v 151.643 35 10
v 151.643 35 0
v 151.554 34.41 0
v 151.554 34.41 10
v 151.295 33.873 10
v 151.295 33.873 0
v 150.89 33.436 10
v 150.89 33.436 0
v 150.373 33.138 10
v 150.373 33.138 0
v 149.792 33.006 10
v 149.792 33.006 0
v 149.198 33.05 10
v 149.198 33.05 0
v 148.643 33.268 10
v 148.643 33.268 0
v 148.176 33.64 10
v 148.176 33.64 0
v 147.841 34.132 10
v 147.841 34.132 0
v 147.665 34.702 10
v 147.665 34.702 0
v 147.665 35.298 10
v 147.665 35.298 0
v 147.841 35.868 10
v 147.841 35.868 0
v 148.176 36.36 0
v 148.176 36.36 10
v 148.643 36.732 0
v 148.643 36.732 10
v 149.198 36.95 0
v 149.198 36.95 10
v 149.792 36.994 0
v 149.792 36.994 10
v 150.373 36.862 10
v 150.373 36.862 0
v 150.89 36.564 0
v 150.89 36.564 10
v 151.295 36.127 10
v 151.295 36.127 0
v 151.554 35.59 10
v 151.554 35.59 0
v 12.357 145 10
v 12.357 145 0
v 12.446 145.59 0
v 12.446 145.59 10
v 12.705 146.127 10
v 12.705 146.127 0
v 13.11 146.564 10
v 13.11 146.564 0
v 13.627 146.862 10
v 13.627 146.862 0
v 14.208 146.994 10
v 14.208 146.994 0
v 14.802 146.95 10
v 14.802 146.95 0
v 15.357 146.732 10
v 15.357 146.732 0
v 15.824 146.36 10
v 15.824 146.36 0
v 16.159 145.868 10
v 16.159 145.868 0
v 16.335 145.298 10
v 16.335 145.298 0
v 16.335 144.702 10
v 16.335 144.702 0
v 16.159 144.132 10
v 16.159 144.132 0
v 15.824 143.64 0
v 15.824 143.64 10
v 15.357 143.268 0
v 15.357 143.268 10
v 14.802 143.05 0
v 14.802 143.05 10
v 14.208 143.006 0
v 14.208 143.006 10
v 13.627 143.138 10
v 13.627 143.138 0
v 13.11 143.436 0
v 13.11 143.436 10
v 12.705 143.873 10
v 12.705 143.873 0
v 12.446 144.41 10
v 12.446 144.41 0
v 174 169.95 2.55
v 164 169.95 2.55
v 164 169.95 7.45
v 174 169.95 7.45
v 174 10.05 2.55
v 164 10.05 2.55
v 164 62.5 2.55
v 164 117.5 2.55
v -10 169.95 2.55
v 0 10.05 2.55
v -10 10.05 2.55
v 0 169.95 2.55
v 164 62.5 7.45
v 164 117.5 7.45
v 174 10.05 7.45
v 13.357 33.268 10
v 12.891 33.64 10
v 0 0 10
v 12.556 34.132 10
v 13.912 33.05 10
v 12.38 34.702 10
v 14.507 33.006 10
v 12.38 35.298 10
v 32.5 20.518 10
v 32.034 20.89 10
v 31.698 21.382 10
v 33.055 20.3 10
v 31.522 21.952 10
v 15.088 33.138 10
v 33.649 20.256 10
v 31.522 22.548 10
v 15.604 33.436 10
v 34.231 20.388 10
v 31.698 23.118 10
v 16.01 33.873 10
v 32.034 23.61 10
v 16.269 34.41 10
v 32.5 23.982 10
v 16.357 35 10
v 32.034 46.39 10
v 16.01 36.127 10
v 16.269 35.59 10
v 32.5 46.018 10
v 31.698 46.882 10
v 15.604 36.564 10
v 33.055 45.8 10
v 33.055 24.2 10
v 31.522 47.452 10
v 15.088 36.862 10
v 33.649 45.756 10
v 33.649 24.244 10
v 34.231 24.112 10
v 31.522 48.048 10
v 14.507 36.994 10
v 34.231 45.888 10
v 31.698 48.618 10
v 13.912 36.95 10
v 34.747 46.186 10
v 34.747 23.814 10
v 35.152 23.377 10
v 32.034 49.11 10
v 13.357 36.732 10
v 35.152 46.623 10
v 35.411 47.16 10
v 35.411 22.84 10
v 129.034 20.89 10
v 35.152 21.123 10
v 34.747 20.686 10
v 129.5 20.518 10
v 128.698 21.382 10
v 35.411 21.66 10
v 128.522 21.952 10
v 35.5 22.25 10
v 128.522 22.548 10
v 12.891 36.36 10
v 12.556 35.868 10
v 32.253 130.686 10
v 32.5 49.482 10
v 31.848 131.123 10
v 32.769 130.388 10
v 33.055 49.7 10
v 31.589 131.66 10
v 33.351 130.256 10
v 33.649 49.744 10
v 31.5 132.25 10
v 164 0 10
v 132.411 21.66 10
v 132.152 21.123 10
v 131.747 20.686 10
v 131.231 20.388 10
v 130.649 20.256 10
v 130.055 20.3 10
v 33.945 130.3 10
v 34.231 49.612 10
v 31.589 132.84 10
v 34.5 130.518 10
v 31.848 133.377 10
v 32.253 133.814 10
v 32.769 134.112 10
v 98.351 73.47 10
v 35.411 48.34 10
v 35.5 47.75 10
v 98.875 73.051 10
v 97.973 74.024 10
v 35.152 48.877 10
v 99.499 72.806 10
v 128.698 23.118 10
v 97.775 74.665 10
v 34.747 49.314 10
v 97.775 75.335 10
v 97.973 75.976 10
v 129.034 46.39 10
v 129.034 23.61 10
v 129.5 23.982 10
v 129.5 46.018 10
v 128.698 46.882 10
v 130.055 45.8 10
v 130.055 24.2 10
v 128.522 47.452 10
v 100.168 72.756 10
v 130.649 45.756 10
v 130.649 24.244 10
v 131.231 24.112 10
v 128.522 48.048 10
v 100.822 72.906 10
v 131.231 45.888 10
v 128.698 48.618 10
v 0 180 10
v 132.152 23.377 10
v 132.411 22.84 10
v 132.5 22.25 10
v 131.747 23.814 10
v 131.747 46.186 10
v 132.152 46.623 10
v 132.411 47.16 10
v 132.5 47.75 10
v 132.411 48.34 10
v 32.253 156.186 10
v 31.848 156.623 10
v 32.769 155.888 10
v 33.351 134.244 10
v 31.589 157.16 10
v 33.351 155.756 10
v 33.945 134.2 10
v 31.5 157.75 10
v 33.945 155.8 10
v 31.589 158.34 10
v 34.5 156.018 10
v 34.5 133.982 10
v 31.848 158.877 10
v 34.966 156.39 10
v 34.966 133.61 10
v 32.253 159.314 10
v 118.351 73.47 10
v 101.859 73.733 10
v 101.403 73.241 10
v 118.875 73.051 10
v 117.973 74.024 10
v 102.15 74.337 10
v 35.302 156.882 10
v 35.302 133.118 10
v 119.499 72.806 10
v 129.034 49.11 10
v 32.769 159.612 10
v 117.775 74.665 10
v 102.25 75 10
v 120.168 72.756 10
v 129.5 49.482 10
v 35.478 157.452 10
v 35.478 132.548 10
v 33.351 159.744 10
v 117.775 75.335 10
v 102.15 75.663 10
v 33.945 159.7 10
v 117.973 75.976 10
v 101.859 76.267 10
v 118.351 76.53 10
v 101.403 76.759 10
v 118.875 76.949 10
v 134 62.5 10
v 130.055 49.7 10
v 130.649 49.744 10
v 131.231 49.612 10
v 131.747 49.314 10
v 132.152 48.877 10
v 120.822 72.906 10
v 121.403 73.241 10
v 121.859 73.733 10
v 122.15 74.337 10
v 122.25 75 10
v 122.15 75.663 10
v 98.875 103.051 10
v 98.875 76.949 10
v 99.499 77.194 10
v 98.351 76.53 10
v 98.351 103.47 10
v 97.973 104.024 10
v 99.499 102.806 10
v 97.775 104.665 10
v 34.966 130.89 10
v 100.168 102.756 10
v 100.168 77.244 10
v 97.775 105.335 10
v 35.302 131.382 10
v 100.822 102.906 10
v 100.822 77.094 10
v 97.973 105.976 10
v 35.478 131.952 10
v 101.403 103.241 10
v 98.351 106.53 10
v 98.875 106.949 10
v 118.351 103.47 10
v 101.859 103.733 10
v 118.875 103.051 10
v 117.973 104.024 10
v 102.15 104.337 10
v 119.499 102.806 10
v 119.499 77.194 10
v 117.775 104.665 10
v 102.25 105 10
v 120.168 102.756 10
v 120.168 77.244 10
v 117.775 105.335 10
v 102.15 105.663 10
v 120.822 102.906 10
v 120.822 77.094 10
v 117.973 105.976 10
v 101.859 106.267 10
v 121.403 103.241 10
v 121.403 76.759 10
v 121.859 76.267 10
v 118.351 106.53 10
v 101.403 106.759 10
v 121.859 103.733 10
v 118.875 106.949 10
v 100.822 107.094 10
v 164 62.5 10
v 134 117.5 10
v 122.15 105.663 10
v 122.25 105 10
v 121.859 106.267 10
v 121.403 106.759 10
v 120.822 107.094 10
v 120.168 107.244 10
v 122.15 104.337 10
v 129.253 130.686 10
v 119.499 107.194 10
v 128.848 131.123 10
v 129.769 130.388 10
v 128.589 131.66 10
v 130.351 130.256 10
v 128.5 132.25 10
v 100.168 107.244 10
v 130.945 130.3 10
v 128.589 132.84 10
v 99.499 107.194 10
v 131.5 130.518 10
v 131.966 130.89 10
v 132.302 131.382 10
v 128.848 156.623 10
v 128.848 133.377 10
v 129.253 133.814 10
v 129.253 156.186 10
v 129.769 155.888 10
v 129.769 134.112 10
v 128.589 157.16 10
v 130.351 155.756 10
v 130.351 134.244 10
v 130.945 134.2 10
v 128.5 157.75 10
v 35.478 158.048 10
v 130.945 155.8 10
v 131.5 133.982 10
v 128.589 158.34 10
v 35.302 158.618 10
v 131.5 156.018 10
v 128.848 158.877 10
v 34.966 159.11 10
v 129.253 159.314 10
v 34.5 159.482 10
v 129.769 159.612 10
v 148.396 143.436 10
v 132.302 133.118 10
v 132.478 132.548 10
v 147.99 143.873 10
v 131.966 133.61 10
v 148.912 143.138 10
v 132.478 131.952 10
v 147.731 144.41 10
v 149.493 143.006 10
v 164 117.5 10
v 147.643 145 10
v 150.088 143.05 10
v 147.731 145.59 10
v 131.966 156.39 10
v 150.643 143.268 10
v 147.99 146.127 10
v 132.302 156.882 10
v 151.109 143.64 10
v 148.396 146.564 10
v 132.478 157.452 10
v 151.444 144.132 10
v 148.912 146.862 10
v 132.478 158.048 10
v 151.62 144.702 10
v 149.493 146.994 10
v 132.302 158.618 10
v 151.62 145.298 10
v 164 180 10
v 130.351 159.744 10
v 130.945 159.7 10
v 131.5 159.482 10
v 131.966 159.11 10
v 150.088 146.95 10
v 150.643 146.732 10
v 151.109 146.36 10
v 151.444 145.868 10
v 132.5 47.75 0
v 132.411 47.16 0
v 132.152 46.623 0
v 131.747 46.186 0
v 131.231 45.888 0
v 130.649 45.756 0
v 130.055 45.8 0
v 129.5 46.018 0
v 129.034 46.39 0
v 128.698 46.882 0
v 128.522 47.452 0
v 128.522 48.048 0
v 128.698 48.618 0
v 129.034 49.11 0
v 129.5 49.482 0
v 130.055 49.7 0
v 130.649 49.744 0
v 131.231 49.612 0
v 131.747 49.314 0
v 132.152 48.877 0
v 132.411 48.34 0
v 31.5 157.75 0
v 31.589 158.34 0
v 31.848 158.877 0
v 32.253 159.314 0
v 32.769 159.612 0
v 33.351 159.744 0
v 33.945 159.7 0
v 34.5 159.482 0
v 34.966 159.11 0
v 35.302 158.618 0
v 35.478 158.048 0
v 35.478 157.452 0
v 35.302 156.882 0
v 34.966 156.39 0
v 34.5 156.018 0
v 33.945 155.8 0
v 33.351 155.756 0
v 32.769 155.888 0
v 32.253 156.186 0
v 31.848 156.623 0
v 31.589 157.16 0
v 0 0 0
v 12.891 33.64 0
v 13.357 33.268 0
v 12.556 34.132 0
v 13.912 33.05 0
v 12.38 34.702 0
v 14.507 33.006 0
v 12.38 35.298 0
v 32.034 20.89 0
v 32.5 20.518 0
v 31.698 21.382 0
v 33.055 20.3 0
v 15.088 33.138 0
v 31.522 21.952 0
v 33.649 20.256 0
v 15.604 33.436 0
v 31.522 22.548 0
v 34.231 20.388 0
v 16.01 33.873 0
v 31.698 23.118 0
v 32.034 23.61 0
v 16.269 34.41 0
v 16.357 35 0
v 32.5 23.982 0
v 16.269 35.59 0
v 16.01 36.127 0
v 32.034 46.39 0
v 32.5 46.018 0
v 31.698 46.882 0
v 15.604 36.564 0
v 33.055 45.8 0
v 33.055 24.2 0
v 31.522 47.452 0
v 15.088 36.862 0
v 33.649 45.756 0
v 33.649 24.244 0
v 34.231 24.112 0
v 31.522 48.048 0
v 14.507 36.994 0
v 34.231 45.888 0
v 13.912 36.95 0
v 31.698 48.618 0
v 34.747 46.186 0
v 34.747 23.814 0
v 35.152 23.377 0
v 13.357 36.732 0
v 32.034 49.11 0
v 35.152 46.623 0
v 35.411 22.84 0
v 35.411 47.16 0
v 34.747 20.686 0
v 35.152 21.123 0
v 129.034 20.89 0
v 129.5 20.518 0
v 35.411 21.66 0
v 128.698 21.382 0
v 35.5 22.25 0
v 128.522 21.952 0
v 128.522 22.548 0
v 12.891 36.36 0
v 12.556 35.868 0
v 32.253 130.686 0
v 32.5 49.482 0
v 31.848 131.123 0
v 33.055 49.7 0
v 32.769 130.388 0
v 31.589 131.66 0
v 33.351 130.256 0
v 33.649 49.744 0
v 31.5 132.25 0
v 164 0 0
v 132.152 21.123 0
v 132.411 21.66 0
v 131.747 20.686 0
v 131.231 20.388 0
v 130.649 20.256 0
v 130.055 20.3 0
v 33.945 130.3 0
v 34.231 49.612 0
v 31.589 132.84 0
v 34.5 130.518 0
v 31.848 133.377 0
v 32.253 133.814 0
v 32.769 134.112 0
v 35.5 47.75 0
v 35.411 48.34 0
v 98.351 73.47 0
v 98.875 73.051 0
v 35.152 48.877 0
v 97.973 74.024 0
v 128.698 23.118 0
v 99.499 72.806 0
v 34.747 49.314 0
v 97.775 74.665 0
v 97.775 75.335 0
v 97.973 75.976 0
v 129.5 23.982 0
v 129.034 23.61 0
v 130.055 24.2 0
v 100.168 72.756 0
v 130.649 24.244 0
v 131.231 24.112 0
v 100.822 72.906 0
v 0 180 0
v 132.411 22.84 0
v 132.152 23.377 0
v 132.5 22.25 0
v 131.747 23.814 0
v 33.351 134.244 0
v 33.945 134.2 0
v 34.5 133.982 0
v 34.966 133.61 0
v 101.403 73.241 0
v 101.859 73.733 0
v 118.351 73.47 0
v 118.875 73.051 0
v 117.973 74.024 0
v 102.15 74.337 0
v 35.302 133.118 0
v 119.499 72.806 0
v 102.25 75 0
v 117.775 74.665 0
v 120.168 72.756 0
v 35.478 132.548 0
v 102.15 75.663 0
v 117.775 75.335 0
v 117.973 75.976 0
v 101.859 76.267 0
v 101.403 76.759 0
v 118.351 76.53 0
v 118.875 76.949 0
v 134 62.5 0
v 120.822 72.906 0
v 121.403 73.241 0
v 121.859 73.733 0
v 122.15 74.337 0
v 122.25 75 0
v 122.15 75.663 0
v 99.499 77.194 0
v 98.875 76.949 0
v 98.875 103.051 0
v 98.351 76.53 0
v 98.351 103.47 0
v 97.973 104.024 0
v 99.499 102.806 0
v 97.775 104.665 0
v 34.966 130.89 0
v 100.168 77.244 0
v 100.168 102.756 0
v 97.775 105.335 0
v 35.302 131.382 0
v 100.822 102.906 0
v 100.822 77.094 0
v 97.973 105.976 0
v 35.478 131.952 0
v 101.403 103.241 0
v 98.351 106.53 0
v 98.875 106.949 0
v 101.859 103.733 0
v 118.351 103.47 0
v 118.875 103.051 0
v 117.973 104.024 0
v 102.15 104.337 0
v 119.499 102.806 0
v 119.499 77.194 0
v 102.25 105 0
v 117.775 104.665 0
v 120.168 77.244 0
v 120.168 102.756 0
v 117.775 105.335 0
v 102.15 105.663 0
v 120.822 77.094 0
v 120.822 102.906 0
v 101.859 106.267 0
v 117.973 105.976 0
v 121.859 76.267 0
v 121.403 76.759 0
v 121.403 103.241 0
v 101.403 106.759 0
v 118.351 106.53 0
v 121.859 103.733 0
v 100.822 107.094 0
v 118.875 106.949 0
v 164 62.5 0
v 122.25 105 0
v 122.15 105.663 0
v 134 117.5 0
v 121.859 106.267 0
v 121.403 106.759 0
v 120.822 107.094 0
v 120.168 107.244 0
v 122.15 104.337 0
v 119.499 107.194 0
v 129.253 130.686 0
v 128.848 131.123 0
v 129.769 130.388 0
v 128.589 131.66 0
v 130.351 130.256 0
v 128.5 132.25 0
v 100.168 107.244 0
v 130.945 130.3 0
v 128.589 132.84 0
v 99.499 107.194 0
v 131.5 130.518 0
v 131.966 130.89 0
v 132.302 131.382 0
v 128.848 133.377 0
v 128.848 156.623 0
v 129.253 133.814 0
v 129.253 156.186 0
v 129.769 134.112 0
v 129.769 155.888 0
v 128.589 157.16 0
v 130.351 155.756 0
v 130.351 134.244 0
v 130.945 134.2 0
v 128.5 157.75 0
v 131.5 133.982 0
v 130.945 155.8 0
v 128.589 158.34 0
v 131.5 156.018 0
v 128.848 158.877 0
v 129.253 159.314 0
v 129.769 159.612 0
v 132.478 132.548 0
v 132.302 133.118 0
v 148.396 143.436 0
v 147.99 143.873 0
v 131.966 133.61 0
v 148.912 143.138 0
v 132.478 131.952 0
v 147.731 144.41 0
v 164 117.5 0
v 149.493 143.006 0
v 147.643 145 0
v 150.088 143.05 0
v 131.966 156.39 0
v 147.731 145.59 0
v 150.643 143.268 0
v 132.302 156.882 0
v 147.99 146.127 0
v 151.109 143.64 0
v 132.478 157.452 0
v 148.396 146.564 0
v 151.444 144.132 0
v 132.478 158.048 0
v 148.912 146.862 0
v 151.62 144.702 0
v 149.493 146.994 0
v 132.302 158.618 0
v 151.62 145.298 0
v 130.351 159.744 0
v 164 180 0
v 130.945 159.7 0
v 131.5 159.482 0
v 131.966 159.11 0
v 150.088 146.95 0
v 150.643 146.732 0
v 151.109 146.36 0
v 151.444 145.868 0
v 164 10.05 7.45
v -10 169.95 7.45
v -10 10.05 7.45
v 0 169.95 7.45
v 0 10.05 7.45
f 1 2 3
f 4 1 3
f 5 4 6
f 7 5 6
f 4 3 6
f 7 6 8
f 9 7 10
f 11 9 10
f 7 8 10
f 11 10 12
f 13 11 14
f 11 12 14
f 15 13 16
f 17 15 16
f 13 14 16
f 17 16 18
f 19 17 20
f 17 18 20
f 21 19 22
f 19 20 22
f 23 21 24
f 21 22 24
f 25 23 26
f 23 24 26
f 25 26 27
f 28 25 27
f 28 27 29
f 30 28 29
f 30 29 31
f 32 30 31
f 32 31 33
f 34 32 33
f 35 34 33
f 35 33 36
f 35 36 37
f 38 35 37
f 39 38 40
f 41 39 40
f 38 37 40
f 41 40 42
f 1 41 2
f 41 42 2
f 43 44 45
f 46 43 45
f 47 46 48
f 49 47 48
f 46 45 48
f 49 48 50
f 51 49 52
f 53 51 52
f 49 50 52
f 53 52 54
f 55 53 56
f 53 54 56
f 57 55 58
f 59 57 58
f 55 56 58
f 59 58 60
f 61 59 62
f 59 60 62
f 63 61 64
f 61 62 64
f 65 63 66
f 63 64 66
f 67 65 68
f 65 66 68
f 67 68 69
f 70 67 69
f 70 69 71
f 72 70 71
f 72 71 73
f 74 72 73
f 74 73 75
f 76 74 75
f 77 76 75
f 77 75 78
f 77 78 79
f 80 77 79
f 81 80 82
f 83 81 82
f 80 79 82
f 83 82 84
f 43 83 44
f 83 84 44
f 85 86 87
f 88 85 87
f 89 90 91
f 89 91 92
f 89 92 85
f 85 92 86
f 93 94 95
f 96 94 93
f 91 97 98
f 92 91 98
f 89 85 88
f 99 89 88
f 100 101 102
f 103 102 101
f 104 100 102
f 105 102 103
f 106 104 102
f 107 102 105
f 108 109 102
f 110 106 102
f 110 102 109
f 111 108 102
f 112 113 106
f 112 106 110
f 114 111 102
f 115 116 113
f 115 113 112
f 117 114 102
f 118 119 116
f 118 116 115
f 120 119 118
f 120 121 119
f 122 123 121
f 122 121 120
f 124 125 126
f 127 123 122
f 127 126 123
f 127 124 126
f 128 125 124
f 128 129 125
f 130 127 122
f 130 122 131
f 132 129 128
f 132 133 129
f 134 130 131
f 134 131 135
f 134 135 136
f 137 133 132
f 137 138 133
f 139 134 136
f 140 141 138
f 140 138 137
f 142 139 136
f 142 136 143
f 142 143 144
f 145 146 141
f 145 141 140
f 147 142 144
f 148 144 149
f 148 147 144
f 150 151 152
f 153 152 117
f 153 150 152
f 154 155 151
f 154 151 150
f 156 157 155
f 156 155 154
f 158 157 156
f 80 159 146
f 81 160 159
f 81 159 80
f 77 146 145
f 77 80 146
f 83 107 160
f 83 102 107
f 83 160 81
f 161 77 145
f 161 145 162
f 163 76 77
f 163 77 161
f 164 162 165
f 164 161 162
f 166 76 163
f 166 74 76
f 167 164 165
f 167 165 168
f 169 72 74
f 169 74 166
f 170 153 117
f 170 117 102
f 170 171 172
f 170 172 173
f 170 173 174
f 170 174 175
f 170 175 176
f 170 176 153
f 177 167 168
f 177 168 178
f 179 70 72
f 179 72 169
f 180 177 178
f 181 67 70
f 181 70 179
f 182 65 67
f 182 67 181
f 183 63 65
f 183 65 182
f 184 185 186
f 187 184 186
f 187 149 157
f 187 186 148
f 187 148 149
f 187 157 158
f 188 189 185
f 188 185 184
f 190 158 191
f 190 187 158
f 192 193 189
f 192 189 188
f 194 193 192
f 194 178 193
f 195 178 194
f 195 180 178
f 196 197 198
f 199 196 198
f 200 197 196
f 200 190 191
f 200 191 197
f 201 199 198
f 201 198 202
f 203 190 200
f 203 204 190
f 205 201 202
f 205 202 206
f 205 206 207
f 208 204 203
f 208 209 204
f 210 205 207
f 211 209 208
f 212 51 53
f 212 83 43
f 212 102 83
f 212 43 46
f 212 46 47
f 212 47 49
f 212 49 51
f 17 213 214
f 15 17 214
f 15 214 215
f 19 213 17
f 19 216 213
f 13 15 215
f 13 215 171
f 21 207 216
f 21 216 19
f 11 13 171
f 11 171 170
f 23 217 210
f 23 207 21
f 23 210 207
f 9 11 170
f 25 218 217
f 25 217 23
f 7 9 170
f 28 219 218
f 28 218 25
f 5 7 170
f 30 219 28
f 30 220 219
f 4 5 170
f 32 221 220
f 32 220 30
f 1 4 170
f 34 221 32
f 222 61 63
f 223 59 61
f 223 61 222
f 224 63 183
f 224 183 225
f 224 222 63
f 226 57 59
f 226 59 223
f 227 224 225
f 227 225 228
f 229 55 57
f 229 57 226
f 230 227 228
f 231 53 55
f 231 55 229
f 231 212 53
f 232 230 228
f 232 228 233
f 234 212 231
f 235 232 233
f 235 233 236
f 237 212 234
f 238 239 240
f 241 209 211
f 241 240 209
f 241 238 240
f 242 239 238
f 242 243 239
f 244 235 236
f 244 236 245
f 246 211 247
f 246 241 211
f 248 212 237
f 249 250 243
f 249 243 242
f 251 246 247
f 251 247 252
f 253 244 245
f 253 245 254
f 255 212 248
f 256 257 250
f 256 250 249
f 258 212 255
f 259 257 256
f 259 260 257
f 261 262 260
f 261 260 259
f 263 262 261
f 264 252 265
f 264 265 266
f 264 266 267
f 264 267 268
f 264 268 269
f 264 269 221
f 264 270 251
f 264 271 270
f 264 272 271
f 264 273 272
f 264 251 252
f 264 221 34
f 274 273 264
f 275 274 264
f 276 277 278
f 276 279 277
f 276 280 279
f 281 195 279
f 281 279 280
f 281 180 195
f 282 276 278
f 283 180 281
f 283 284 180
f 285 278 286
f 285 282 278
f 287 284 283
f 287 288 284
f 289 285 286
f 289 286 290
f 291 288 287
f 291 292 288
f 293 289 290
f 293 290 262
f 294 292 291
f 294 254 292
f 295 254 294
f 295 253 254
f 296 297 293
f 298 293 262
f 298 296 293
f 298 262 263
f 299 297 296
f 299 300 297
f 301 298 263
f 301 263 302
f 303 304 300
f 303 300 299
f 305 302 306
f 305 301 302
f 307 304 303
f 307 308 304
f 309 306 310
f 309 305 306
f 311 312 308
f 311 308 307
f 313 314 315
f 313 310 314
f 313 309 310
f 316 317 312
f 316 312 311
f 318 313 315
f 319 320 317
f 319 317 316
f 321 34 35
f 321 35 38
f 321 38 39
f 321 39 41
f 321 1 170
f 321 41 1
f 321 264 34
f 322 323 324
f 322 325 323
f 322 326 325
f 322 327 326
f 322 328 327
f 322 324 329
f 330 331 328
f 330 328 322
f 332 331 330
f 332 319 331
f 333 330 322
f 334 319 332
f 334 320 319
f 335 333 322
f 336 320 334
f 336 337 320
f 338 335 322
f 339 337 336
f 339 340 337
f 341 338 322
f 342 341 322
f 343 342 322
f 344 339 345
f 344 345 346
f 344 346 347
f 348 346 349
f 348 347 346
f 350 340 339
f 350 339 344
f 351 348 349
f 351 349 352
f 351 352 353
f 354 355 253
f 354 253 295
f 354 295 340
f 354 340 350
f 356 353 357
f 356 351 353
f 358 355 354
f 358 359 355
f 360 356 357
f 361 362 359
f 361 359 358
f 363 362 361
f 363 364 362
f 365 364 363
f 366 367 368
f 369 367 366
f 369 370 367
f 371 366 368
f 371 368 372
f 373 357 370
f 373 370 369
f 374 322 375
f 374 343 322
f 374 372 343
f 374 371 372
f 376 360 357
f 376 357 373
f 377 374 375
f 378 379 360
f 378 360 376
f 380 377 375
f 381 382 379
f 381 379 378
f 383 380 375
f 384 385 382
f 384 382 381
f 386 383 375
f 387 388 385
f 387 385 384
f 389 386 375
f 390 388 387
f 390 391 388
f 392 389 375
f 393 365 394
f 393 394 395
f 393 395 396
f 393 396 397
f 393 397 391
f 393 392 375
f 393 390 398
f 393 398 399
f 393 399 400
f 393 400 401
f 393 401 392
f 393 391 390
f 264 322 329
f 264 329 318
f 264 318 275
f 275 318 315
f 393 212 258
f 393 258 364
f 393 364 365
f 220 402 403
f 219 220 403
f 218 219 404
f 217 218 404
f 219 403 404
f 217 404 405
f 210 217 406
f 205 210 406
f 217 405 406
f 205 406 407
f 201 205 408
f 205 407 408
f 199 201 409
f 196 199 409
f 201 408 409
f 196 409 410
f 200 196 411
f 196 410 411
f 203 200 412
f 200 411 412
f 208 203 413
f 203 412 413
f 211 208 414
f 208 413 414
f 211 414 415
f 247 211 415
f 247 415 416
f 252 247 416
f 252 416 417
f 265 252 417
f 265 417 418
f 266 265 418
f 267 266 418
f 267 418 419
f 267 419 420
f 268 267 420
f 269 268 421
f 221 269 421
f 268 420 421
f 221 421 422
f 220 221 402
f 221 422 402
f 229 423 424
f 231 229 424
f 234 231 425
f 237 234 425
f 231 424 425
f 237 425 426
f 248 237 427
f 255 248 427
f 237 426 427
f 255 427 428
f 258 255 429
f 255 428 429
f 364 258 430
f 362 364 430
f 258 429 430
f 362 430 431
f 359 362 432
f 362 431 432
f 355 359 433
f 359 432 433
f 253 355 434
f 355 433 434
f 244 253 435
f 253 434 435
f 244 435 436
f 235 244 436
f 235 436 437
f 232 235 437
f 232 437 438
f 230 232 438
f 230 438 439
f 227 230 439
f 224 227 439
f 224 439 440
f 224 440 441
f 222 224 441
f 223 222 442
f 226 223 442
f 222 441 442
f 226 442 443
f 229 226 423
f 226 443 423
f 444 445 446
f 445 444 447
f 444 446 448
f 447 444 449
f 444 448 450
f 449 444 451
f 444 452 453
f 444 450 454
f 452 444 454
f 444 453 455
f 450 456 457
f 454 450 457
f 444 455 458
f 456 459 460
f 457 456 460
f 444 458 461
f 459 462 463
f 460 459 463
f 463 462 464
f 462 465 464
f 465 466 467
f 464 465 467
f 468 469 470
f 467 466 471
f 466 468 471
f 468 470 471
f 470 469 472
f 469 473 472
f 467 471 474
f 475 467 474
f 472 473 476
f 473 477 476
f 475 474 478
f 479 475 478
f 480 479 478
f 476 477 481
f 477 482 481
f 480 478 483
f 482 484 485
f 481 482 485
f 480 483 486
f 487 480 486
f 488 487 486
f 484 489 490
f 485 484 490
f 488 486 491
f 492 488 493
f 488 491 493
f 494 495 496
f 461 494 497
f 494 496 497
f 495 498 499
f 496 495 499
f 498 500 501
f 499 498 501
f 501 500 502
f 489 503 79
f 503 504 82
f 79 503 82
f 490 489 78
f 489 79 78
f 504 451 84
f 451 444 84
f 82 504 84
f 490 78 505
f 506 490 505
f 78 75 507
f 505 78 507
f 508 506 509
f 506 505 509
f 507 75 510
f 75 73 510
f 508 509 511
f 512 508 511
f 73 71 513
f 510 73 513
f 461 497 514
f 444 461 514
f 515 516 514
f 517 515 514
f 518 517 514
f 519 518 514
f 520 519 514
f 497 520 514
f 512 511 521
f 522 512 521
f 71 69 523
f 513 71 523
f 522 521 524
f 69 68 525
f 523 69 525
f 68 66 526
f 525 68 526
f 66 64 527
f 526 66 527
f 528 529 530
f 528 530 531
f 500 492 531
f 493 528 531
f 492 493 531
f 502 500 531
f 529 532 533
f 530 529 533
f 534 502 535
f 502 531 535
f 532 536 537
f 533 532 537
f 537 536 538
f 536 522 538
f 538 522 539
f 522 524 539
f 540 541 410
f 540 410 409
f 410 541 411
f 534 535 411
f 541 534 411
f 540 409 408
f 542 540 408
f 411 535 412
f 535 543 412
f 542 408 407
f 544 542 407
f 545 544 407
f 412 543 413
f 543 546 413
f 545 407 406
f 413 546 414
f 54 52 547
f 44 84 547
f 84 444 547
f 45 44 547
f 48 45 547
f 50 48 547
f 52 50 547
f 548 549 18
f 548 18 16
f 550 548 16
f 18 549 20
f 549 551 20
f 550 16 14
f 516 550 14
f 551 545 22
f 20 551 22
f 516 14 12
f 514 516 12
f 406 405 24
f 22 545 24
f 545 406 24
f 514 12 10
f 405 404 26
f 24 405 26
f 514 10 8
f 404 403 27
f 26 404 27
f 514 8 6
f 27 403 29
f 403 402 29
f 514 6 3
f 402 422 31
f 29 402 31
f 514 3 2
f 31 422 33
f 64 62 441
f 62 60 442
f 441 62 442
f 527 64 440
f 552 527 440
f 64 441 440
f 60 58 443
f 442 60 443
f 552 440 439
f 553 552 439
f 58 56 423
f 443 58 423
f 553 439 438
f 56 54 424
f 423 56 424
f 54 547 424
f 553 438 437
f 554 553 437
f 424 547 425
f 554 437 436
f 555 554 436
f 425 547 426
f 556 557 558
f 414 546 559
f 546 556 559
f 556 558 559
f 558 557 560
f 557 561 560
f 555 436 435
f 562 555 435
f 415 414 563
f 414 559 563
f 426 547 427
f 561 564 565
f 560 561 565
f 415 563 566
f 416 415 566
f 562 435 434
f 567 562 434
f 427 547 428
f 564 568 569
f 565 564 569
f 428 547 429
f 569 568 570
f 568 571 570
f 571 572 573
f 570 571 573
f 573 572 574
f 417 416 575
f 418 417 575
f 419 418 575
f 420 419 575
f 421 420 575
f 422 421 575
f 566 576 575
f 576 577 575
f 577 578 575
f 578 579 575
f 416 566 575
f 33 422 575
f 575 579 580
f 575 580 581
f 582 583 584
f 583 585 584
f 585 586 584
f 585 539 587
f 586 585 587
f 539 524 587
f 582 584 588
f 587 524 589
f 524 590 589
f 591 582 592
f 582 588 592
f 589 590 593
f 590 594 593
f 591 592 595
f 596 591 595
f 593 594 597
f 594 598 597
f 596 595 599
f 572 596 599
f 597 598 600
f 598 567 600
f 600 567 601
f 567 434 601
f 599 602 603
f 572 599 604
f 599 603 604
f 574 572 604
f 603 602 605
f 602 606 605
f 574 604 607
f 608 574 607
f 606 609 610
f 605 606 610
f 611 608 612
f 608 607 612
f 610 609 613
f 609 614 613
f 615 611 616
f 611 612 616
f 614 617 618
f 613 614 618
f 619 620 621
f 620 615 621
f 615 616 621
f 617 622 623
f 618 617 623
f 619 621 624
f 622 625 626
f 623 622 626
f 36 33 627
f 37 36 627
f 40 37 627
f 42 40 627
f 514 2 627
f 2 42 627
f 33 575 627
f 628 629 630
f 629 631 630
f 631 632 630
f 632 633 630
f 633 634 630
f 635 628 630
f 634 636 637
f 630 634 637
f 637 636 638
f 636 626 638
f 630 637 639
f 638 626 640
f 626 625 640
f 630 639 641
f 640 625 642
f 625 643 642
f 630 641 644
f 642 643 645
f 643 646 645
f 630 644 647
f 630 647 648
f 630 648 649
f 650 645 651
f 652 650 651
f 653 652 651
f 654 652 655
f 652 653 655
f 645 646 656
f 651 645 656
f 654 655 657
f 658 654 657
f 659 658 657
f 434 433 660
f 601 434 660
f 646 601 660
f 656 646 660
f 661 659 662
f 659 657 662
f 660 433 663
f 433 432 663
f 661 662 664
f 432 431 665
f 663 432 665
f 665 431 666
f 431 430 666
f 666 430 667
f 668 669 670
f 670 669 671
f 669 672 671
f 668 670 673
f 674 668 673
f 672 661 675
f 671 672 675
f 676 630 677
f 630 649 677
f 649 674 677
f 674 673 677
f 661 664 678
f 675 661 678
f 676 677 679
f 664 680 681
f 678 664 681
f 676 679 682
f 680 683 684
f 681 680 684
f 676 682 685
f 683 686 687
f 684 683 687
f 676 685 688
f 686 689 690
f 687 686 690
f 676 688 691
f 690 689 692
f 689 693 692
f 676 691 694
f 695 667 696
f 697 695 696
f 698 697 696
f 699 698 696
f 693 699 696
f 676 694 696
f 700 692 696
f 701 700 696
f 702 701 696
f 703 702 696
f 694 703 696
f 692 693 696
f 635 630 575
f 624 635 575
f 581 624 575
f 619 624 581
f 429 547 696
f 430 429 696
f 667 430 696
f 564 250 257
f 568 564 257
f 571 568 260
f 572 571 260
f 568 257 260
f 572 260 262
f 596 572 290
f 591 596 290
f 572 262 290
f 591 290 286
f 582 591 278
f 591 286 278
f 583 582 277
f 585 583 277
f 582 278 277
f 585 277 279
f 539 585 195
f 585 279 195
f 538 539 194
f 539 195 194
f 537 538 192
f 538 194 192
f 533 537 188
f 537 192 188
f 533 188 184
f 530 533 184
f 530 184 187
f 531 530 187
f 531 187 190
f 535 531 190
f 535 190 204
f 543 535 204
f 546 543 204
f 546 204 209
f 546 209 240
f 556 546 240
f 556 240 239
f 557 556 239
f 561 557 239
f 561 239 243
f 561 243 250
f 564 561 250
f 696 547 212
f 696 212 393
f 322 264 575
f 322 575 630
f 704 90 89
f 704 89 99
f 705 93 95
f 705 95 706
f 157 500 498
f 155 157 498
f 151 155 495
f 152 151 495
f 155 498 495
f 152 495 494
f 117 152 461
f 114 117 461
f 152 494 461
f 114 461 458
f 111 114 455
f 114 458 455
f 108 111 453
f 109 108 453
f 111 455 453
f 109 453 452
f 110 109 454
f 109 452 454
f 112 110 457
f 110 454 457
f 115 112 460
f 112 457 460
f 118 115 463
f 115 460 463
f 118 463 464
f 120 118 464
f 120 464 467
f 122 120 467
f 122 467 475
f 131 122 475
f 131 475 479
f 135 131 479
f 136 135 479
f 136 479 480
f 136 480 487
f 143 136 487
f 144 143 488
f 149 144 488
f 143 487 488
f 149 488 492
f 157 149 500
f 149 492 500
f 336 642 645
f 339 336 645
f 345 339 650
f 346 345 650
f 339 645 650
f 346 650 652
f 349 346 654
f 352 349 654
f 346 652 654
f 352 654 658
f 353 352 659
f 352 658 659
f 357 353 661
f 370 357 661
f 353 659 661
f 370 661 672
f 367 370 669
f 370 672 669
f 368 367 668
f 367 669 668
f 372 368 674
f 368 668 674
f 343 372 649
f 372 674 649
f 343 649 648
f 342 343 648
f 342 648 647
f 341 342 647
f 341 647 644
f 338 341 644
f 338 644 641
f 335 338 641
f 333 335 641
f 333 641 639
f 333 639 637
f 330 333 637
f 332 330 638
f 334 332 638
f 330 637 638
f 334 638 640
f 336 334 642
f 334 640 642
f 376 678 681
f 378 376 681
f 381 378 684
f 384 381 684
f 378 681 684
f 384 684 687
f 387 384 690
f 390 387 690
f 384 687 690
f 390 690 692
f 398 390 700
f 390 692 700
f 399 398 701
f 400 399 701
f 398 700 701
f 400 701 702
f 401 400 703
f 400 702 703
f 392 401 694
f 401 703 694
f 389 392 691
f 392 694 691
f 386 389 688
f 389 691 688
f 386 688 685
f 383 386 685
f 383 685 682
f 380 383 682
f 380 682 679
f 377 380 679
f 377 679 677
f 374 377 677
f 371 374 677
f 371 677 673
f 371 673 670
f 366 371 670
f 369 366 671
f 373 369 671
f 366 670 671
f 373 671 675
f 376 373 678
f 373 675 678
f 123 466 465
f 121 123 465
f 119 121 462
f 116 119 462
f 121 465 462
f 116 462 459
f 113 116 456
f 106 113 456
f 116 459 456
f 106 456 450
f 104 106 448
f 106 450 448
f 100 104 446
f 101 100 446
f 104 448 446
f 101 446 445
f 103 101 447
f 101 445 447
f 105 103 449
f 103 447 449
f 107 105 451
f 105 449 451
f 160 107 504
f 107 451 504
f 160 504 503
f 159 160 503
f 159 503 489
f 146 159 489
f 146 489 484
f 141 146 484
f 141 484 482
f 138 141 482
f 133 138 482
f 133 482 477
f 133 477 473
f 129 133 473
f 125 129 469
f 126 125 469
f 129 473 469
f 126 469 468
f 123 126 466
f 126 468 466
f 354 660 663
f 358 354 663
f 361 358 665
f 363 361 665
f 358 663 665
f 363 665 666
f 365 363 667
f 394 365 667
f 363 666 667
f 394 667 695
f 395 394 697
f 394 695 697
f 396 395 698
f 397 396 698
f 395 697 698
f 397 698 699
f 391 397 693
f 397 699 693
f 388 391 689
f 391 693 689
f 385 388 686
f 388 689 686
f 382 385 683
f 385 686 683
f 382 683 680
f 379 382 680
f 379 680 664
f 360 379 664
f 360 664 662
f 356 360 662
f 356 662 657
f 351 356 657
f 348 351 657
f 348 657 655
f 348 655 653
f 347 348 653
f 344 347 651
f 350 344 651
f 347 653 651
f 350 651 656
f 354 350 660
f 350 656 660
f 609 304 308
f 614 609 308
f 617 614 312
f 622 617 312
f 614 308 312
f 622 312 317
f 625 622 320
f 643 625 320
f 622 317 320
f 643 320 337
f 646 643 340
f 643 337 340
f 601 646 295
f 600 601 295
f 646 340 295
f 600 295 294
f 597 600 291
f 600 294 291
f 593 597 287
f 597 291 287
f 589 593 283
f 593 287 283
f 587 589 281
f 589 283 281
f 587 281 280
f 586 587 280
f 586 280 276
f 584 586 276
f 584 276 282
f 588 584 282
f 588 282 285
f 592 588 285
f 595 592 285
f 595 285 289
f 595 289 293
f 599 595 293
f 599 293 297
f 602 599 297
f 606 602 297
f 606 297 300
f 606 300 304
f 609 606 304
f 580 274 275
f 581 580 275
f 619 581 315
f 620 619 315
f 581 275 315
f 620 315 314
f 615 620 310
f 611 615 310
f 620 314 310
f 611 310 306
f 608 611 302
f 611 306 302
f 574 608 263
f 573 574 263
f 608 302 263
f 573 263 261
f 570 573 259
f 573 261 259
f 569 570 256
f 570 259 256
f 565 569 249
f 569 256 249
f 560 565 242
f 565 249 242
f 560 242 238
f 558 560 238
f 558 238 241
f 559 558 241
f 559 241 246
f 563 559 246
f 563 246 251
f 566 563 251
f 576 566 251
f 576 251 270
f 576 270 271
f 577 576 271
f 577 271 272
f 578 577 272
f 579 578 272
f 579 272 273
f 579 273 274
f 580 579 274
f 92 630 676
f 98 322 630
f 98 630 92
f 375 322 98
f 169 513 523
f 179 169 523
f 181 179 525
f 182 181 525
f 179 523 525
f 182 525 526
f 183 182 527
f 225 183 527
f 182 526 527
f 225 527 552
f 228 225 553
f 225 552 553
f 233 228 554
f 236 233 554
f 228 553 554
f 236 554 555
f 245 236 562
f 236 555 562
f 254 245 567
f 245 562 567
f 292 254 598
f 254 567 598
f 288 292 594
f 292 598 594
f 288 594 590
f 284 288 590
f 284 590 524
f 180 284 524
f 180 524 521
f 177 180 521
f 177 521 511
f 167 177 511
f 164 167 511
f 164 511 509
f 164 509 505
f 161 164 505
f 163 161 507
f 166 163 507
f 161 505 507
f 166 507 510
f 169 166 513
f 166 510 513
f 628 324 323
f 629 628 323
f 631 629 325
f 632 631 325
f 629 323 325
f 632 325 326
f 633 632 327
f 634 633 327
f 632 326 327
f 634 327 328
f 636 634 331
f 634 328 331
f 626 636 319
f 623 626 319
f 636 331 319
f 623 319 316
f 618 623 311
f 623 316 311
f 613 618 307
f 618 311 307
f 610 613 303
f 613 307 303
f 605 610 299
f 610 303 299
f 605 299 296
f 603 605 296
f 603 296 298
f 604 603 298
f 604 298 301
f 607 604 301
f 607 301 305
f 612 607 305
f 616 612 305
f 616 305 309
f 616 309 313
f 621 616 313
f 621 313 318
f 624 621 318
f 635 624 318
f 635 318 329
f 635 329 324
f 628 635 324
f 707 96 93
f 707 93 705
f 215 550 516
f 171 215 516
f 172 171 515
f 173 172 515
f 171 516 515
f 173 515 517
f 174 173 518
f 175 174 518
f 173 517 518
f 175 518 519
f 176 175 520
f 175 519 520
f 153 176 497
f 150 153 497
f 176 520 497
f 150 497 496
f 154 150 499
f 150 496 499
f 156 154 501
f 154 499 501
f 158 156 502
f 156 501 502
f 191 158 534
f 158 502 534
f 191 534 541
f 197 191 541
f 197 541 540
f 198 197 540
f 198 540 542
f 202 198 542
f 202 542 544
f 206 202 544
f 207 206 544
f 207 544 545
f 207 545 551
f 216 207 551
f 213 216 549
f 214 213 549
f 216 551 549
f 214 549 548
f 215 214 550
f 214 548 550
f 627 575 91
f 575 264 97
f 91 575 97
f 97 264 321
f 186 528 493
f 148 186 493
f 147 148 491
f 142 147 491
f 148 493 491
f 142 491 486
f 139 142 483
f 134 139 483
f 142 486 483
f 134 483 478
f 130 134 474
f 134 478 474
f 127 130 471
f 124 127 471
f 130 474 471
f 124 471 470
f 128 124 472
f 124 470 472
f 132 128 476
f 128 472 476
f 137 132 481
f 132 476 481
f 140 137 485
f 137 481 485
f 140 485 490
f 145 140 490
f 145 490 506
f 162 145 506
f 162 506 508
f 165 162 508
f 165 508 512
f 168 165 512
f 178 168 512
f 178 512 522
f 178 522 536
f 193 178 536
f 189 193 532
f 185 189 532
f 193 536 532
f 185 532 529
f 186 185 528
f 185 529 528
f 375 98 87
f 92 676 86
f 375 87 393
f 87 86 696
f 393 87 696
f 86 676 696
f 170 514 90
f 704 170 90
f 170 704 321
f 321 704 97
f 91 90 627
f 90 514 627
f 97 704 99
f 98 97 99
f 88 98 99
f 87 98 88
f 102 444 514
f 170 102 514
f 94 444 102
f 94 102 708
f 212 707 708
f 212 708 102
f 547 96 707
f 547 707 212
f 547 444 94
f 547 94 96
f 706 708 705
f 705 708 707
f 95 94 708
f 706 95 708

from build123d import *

# Parameters (mm, degrees)
SKETCH_1_W          = 164
SKETCH_1_H          = 180
EXTRUDE_1_DEPTH     = 10
SKETCH_2_W          = 4.9
SKETCH_2_H          = 159.9
EXTRUDE_2_DEPTH     = 10
SKETCH_3_R          = 2
CUT_EXTRUDE_1_DEPTH = 10
SKETCH_7_R          = 2.25
SKETCH_7_W          = 30
SKETCH_7_H          = 55
CUT_EXTRUDE_5_DEPTH = 251.551391934


with BuildPart() as part:
    # 草图1 → 凸台-拉伸1 (new body)
    with BuildSketch(Plane.XY):
        with Locations((82, 90)):
            Rectangle(SKETCH_1_W, SKETCH_1_H)
    extrude(amount=EXTRUDE_1_DEPTH)

    # 草图2 → 凸台-拉伸2 (add)
    with BuildSketch(Plane.ZY):
        with Locations((5, 90)):
            Rectangle(SKETCH_2_W, SKETCH_2_H)
    extrude_2 = extrude(amount=EXTRUDE_2_DEPTH)

    # 镜向1: 凸台-拉伸2 across plane
    add(extrude_2.mirror(Plane(origin=(82, 0, 0), x_dir=(0, 0, 1), z_dir=(1, 0, 0))))

    # 草图3 → 切除-拉伸1 (cut)
    with BuildSketch(Plane(origin=(0, 0, 0), x_dir=(-1, 0, 0), z_dir=(0, 0, -1))):
        with Locations((-149.6425573, 145)):
            Circle(SKETCH_3_R)
        with Locations((-130.5, 157.75)):
            Circle(SKETCH_3_R)
        with Locations((-130.5, 132.25)):
            Circle(SKETCH_3_R)
        with Locations((-14.3574427, 145)):
            Circle(SKETCH_3_R)
        with Locations((-33.5, 157.75)):
            Circle(SKETCH_3_R)
        with Locations((-33.5, 132.25)):
            Circle(SKETCH_3_R)
        with Locations(Location((-130.5, 47.75, 0), (0, 0, 180))):
            Circle(SKETCH_3_R)
        with Locations(Location((-130.5, 22.25, 0), (0, 0, 180))):
            Circle(SKETCH_3_R)
        with Locations(Location((-149.6425573, 35, 0), (0, 0, 180))):
            Circle(SKETCH_3_R)
        with Locations(Location((-33.5, 47.75, 0), (0, 0, 180))):
            Circle(SKETCH_3_R)
        with Locations(Location((-33.5, 22.25, 0), (0, 0, 180))):
            Circle(SKETCH_3_R)
        with Locations(Location((-14.3574427, 35, 0), (0, 0, 180))):
            Circle(SKETCH_3_R)
    extrude(amount=-CUT_EXTRUDE_1_DEPTH, mode=Mode.SUBTRACT)

    # 草图7 → 切除-拉伸5 (cut, through all)
    with BuildSketch(Plane.XY.offset(10)):
        with Locations((120, 105)):
            Circle(SKETCH_7_R)
        with Locations((120, 75)):
            Circle(SKETCH_7_R)
        with Locations((100, 105)):
            Circle(SKETCH_7_R)
        with Locations((100, 75)):
            Circle(SKETCH_7_R)
        with Locations((149, 90)):
            Rectangle(SKETCH_7_W, SKETCH_7_H)
    extrude(amount=-CUT_EXTRUDE_5_DEPTH, mode=Mode.SUBTRACT)


solid = part.part
